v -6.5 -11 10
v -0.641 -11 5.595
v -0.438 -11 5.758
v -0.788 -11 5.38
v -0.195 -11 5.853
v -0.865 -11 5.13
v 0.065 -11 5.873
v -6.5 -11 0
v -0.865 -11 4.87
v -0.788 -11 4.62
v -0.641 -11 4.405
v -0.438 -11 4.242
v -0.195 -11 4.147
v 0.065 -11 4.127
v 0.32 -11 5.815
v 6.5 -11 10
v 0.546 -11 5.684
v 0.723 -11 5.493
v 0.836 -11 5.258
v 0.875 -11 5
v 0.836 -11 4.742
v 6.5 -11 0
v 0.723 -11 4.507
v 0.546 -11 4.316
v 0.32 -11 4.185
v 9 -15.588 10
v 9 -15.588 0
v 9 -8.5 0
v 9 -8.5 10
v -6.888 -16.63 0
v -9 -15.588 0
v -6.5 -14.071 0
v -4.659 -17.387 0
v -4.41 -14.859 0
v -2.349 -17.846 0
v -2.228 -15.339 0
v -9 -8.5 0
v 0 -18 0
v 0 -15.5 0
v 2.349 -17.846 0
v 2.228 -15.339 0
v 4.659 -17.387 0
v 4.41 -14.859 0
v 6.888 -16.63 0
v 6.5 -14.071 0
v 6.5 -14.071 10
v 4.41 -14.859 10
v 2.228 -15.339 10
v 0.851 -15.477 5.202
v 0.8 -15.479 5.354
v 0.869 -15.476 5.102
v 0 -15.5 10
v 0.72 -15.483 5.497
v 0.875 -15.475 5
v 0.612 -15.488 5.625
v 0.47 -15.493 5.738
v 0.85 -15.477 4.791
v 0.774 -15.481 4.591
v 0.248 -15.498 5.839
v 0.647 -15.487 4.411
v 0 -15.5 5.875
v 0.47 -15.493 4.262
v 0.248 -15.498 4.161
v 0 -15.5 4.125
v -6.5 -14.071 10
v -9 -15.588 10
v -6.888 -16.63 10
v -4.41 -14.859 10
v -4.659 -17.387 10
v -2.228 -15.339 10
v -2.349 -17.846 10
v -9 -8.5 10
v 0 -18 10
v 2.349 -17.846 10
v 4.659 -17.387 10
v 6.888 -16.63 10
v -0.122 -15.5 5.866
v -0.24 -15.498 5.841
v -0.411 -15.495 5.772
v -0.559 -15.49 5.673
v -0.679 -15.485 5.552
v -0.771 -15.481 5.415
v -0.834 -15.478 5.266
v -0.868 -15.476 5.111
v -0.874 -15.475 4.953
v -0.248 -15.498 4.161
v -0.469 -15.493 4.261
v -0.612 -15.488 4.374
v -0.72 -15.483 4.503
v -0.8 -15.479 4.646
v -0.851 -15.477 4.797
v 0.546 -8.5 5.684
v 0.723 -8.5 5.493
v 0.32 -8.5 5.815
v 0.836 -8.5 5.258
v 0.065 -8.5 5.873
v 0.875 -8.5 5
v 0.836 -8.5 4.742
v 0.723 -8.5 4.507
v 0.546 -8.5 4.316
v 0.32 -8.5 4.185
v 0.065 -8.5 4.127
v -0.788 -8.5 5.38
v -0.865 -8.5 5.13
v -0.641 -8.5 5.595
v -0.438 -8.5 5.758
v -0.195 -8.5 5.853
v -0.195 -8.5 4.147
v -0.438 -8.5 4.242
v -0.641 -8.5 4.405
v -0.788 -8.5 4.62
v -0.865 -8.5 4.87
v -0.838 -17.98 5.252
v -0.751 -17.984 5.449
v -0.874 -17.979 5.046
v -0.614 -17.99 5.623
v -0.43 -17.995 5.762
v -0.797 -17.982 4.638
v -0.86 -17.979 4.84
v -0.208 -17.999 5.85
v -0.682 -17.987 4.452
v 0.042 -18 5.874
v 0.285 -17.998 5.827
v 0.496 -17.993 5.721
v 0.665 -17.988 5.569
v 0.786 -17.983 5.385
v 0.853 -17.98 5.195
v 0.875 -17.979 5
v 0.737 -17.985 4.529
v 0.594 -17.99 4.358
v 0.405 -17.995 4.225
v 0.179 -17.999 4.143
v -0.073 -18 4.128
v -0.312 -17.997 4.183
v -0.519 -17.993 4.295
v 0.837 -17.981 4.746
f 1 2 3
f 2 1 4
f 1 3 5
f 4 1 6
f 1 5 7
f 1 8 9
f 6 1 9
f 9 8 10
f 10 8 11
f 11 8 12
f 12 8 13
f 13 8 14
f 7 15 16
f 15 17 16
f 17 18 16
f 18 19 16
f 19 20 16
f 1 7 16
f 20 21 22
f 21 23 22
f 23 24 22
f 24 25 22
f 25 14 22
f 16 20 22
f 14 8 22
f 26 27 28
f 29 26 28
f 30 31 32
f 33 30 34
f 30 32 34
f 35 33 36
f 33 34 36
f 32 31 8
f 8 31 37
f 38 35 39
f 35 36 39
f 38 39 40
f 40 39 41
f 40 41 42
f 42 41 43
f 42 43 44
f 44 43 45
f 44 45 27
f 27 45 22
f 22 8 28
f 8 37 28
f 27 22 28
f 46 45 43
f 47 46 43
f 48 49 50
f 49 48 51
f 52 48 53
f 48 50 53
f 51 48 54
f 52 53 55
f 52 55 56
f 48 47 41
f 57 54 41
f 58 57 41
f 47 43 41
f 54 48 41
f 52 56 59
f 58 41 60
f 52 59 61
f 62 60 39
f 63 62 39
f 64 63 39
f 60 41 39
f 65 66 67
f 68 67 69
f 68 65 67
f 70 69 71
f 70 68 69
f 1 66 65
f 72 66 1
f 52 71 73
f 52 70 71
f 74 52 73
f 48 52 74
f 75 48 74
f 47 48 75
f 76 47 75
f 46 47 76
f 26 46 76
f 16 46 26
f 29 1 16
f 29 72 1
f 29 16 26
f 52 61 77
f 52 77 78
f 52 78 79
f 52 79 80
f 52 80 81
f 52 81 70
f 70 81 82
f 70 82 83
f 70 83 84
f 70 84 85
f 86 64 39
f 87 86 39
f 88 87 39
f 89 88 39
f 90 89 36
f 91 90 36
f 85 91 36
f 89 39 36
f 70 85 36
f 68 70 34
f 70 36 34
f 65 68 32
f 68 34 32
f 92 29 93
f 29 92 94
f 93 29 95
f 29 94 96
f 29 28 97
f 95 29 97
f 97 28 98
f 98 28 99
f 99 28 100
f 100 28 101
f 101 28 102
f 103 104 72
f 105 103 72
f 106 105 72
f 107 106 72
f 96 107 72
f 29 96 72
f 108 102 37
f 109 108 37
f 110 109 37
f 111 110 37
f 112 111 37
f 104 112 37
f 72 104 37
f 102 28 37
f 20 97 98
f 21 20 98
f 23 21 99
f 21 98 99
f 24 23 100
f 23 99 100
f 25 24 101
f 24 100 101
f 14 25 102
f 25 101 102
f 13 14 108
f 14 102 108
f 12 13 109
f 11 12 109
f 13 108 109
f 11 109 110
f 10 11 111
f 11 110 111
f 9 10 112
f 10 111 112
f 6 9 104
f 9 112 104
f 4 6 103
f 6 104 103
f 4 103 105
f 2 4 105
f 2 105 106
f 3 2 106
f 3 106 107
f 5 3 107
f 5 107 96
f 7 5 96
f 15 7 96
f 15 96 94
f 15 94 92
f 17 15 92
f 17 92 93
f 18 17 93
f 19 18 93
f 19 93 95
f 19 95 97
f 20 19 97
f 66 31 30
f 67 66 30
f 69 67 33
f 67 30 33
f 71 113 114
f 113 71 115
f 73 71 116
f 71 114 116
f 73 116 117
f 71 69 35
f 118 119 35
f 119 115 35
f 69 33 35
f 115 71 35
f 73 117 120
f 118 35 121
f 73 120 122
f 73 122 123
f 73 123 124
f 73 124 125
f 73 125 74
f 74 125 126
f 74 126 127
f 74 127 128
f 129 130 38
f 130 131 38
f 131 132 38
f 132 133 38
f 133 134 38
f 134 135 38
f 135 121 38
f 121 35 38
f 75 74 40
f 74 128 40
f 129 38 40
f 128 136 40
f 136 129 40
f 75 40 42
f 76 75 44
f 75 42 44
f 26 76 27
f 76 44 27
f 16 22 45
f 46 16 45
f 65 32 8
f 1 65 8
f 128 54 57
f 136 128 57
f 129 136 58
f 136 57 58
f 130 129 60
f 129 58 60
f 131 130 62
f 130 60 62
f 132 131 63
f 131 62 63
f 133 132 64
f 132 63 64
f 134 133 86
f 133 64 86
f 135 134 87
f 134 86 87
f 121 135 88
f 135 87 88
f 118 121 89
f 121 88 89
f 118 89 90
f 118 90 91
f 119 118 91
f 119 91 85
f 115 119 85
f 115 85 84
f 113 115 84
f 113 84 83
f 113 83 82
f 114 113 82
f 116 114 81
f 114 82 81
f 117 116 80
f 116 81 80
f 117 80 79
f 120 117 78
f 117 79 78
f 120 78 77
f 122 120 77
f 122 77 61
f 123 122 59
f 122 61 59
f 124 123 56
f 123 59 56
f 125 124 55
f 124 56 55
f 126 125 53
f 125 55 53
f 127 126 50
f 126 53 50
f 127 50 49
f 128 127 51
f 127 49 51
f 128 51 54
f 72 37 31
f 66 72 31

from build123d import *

# Parameters (mm, degrees)
BOSS_EXTRUDE1_DEPTH = 10
SKETCH2_R           = 0.875
CUT_EXTRUDE3_DEPTH  = 23


with BuildPart() as part:
    # Sketch1 → Boss-Extrude1 (new body)
    with BuildSketch(Plane.XY):
        with BuildLine():
            ThreePointArc((6.5, -14.071247279), (3.327586751, -15.138598562), (0, -15.5))
            ThreePointArc((0, -15.5), (-3.327586751, -15.138598562), (-6.5, -14.071247279))
            ThreePointArc((-6.5, -14.071247279), (-7.783922131, -13.403751574), (-9, -12.619429464))
            Line((-9, -12.619429464), (-9, -15.588457268))
            ThreePointArc((-9, -15.588457268), (0, -18), (9, -15.588457268))
            Line((9, -15.588457268), (9, -12.619429464))
            ThreePointArc((9, -12.619429464), (7.783922131, -13.403751574), (6.5, -14.071247279))
        make_face()
        with BuildLine():
            Line((-6.5, -11), (0, -11))
            Line((0, -11), (0, -8.5))
            Line((0, -8.5), (-9, -8.5))
            Line((-9, -8.5), (-9, -12.619429464))
            ThreePointArc((-9, -12.619429464), (-7.783922131, -13.403751574), (-6.5, -14.071247279))
            Line((-6.5, -14.071247279), (-6.5, -12.619429464))
            Line((-6.5, -12.619429464), (-6.5, -11))
        make_face()
        with BuildLine():
            Line((0, -8.5), (0, -11))
            Line((0, -11), (6.5, -11))
            Line((6.5, -11), (6.5, -12.619429464))
            Line((6.5, -12.619429464), (6.5, -14.071247279))
            ThreePointArc((6.5, -14.071247279), (7.783922131, -13.403751574), (9, -12.619429464))
            Line((9, -12.619429464), (9, -8.5))
            Line((9, -8.5), (0, -8.5))
        make_face()
    extrude(amount=BOSS_EXTRUDE1_DEPTH)

    # Sketch2 → Cut-Extrude3 (cut)
    with BuildSketch(Plane(origin=(0, 0, 0), x_dir=(1, 0, 0), z_dir=(0, 1, 0))):
        with Locations((0, -5)):
            Circle(SKETCH2_R)
    extrude(amount=-CUT_EXTRUDE3_DEPTH, mode=Mode.SUBTRACT)


solid = part.part
